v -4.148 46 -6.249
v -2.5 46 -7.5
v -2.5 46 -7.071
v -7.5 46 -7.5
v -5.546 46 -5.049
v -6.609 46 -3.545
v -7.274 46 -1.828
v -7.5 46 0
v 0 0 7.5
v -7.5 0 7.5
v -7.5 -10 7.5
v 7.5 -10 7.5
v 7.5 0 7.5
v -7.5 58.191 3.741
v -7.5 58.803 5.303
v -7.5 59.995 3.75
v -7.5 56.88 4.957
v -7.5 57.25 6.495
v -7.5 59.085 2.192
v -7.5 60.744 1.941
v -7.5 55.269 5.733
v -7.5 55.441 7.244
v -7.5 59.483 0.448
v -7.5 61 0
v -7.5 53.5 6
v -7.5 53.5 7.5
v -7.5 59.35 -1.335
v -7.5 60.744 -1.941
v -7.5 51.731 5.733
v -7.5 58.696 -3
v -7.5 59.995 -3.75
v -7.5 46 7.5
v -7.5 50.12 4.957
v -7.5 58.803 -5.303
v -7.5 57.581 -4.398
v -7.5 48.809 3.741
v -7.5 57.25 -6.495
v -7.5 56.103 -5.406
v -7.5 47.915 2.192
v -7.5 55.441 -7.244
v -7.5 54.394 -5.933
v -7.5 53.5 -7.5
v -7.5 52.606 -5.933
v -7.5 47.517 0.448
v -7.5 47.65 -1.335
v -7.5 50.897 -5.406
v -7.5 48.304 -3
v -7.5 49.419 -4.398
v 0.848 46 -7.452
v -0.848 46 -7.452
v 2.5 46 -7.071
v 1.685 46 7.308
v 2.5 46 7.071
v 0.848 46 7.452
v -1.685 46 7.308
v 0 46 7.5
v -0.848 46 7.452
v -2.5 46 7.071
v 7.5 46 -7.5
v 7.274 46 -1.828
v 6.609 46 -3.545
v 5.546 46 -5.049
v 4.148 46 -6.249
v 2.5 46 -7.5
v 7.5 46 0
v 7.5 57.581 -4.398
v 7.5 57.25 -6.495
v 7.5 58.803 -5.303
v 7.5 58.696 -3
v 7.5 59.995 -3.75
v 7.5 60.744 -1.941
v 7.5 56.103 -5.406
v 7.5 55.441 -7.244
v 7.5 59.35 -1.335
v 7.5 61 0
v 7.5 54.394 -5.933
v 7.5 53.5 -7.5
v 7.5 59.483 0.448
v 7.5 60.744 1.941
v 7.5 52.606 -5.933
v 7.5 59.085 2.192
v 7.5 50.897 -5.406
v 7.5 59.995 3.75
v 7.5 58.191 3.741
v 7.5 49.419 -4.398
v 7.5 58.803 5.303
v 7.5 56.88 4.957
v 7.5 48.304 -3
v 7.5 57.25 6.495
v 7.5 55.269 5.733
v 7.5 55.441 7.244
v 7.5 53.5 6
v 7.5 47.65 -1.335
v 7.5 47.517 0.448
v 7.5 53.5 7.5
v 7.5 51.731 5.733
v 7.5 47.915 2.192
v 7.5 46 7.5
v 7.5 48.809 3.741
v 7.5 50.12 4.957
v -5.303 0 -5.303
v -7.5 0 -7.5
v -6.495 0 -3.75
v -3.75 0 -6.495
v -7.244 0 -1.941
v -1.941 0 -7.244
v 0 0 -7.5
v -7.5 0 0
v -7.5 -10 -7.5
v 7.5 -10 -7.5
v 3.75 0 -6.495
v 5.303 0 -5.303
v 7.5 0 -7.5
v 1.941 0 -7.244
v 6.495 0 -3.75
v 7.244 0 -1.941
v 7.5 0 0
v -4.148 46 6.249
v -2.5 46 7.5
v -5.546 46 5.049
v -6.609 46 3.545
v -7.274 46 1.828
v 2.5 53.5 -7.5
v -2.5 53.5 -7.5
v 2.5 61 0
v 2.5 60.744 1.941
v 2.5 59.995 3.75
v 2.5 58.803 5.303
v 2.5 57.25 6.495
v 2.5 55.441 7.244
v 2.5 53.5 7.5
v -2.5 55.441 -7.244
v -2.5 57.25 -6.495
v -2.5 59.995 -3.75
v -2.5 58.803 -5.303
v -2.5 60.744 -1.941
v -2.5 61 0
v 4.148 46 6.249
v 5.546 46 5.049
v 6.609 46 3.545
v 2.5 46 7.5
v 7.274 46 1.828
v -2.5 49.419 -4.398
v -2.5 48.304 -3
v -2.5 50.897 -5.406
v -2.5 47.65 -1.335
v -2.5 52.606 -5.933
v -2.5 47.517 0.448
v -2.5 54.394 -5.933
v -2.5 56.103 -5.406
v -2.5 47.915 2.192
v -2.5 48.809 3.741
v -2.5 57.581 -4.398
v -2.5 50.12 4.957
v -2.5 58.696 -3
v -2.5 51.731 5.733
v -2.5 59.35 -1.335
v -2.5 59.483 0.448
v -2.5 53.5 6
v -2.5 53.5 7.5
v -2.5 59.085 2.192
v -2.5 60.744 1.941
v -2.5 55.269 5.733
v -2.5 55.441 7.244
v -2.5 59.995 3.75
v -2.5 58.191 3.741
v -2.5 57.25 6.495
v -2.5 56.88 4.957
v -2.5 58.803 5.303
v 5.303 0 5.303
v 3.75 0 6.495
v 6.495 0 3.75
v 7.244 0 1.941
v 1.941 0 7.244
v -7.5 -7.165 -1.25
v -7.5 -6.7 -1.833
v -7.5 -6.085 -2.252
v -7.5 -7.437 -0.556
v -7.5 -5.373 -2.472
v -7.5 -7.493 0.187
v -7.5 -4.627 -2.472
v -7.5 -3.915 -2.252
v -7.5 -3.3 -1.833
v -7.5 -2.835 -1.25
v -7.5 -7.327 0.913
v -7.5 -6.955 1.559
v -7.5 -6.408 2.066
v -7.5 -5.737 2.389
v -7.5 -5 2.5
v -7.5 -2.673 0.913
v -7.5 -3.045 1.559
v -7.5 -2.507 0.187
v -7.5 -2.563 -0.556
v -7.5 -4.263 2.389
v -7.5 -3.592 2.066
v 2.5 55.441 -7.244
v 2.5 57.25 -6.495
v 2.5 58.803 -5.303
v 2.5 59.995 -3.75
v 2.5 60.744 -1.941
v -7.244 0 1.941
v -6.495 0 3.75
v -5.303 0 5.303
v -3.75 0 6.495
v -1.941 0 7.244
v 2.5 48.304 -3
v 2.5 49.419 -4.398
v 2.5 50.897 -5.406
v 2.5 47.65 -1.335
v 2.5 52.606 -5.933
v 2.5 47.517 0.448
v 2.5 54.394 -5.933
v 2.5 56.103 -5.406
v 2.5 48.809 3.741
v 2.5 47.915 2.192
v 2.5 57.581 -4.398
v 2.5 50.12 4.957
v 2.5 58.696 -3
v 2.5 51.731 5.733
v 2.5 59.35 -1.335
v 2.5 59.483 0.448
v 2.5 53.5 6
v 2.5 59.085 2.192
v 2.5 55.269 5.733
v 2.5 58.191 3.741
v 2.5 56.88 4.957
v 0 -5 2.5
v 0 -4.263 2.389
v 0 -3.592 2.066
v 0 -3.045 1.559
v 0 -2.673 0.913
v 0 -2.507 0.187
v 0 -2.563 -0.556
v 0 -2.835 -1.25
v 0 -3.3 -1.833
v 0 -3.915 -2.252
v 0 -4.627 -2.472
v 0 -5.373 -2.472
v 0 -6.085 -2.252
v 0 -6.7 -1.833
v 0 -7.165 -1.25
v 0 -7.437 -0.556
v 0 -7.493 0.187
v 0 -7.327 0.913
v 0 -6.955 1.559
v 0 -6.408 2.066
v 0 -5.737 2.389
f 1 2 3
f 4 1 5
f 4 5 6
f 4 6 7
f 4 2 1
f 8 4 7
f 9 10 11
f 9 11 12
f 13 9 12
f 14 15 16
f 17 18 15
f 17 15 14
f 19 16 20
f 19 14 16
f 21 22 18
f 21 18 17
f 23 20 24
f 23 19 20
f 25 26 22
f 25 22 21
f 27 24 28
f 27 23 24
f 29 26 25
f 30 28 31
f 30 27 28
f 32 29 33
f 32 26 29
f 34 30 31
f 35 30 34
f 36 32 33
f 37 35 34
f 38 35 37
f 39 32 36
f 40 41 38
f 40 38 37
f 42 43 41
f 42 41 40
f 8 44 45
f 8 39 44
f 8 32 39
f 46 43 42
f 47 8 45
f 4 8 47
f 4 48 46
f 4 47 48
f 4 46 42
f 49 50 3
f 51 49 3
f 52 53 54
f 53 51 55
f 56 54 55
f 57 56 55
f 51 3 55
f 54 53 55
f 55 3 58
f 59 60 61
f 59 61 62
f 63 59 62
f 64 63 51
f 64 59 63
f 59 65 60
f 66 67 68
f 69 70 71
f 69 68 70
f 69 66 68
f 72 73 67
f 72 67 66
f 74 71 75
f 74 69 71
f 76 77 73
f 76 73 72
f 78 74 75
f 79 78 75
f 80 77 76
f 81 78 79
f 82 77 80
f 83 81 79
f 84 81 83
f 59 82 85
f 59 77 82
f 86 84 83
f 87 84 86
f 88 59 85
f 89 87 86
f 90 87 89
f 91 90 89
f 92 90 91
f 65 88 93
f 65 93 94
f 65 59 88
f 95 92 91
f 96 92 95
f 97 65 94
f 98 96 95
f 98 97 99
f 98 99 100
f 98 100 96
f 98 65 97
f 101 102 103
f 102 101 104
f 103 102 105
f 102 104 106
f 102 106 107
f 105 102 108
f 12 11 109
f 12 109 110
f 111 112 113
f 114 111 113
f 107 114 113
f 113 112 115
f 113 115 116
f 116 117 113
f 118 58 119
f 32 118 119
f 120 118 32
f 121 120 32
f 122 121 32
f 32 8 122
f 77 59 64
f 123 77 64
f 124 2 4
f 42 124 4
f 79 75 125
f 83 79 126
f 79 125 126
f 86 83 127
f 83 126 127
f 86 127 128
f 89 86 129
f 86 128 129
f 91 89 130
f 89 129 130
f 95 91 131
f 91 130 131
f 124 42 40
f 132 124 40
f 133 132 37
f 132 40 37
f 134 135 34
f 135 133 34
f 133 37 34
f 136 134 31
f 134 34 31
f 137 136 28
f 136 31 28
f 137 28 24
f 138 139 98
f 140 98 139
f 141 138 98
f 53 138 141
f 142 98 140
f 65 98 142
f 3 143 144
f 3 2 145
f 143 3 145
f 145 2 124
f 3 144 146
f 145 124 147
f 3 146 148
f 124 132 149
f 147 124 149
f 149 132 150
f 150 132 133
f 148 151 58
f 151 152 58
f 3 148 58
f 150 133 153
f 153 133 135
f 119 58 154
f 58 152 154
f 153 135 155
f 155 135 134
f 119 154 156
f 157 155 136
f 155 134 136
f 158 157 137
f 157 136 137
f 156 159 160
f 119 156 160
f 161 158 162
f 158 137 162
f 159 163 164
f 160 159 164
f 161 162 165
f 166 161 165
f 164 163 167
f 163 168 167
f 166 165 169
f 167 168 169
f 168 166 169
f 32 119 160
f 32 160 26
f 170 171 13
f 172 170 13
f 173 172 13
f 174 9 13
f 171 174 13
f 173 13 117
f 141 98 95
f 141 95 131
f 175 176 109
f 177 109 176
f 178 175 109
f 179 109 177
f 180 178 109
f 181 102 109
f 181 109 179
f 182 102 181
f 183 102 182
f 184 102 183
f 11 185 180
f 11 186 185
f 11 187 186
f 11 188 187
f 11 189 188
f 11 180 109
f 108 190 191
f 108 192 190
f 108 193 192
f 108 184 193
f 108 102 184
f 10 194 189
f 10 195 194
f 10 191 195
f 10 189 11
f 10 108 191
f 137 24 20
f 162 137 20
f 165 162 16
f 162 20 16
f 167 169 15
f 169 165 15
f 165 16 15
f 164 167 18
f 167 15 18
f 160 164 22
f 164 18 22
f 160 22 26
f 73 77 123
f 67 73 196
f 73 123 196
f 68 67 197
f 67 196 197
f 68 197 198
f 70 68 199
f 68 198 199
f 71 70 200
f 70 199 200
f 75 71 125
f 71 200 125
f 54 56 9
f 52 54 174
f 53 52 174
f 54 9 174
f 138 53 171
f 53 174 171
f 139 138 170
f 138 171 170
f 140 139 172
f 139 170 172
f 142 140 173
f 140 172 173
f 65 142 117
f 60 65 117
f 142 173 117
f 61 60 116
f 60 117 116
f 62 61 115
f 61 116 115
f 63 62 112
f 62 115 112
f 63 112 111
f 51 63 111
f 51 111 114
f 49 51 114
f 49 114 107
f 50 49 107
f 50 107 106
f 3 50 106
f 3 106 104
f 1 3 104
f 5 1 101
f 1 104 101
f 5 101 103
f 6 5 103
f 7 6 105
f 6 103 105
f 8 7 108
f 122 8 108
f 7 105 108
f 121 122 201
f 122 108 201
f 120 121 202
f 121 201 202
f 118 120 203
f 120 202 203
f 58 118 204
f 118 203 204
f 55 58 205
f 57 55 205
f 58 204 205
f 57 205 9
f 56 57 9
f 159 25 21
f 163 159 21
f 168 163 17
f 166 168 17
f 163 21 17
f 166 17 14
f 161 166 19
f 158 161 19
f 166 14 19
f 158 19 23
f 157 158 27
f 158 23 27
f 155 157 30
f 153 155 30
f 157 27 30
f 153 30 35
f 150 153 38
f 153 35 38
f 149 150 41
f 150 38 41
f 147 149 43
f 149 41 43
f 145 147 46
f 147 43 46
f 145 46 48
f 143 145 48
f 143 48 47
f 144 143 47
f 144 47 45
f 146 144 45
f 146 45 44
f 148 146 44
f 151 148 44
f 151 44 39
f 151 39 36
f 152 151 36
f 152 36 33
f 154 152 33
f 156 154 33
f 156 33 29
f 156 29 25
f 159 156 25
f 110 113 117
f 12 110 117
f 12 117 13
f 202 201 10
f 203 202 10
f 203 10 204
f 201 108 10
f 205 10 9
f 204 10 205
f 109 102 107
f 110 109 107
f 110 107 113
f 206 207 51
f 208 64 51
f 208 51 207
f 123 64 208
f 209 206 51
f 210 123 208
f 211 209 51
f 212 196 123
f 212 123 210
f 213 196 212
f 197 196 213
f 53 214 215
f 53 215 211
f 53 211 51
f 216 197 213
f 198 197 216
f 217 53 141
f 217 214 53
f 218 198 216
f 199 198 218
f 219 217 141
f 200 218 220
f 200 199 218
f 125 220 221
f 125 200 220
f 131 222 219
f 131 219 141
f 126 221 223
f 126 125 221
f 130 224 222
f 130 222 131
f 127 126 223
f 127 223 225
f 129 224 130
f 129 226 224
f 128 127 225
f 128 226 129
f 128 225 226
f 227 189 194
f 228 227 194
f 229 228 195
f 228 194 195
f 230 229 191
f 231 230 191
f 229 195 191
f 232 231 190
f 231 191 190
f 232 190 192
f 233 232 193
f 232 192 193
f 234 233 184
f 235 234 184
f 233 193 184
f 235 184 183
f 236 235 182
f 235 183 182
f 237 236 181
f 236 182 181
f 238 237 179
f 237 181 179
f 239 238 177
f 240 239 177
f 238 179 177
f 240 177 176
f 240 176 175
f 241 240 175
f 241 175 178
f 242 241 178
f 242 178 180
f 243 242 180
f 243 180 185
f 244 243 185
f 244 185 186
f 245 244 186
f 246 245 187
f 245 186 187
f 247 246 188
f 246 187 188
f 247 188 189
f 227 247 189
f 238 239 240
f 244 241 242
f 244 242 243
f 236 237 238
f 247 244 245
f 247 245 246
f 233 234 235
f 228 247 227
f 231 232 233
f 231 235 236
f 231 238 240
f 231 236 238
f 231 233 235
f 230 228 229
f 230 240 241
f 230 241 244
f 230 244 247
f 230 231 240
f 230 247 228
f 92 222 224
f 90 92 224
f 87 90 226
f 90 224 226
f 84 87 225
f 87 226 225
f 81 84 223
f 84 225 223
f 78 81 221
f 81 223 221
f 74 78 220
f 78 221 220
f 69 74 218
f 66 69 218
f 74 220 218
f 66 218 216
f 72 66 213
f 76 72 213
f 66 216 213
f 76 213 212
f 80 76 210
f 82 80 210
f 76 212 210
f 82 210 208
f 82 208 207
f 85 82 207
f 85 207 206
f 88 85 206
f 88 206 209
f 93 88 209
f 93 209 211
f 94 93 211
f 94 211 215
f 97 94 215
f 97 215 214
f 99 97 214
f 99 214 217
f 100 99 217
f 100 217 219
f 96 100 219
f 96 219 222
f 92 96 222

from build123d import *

# Parameters (mm, degrees)
SKETCH1_R           = 7.5
BOSS_EXTRUDE1_DEPTH = 46
SKETCH2_W           = 15
SKETCH2_H           = 15
BOSS_EXTRUDE2_DEPTH = 10
SKETCH3_R           = 2.5
CUT_EXTRUDE1_DEPTH  = 7.5
BOSS_EXTRUDE3_DEPTH = 15
CUT_EXTRUDE4_DEPTH  = 64.263338514
SKETCH6_R           = 6
CUT_EXTRUDE5_DEPTH  = 64.263338514
CUT_EXTRUDE7_START  = -5
SKETCH7_R           = 7.5
CUT_EXTRUDE7_DEPTH  = 5
CUT_EXTRUDE8_START  = -5
CUT_EXTRUDE8_DEPTH  = 5


with BuildPart() as part:
    # Sketch1 → Boss-Extrude1 (new body)
    with BuildSketch(Plane(origin=(0, 0, 0), x_dir=(1, 0, 0), z_dir=(0, 1, 0))):
        with Locations(Location((0, 0, 0), (0, 0, 270))):
            Circle(SKETCH1_R)
    extrude(amount=BOSS_EXTRUDE1_DEPTH)

    # Sketch2 → Boss-Extrude2 (add)
    with BuildSketch(Plane.XZ):
        Rectangle(SKETCH2_W, SKETCH2_H)
    extrude(amount=BOSS_EXTRUDE2_DEPTH)

    # Sketch3 → Cut-Extrude1 (cut)
    with BuildSketch(Plane.ZY.offset(7.5)):
        with Locations((0, -5)):
            Circle(SKETCH3_R)
    extrude(amount=-CUT_EXTRUDE1_DEPTH, mode=Mode.SUBTRACT)

    # Sketch4 → Boss-Extrude3 (add)
    with BuildSketch(Plane(origin=(0, 46, 0), x_dir=(1, 0, 0), z_dir=(0, 1, 0))):
        Polygon((0, 7.5), (7.5, 7.5), (7.5, -7.5), (-7.5, -7.5), (-7.5, 7.5), align=None)
    extrude(amount=BOSS_EXTRUDE3_DEPTH)

    # Sketch5 → Cut-Extrude4 (cut, through all)
    with BuildSketch(Plane.ZY.offset(7.5)):
        with BuildLine():
            ThreePointArc((-7.5, 53.5), (-5.303300859, 58.803300859), (0, 61))
            Line((0, 61), (-7.5, 61))
            Line((-7.5, 61), (-7.5, 53.5))
        make_face()
        with BuildLine():
            Line((7.5, 61), (0, 61))
            ThreePointArc((0, 61), (5.303300859, 58.803300859), (7.5, 53.5))
            Line((7.5, 53.5), (7.5, 61))
        make_face()
    extrude(amount=-CUT_EXTRUDE4_DEPTH, mode=Mode.SUBTRACT)

    # Sketch6 → Cut-Extrude5 (cut, through all)
    with BuildSketch(Plane.ZY.offset(7.5)):
        with Locations((0, 53.5)):
            Circle(SKETCH6_R)
    extrude(amount=-CUT_EXTRUDE5_DEPTH, mode=Mode.SUBTRACT)

    # Sketch7 → Cut-Extrude7 (cut)
    with BuildSketch(Plane.ZY.offset(7.5).offset(CUT_EXTRUDE7_START)):
        with Locations((0, 53.5)):
            Circle(SKETCH7_R)
    extrude(amount=-CUT_EXTRUDE7_DEPTH, mode=Mode.SUBTRACT)

    # Sketch8 → Cut-Extrude8 (cut)
    with BuildSketch(Plane.ZY.offset(7.5).offset(CUT_EXTRUDE8_START)):
        with BuildLine():
            Line((-6, 53.5), (-7.5, 53.5))
            Line((-7.5, 53.5), (-7.5, 46))
            Line((-7.5, 46), (0, 46))
            Line((0, 46), (7.5, 46))
            Line((7.5, 46), (7.5, 53.5))
            Line((7.5, 53.5), (6, 53.5))
            ThreePointArc((6, 53.5), (0, 47.5), (-6, 53.5))
        make_face()
    extrude(amount=-CUT_EXTRUDE8_DEPTH, mode=Mode.SUBTRACT)


solid = part.part
